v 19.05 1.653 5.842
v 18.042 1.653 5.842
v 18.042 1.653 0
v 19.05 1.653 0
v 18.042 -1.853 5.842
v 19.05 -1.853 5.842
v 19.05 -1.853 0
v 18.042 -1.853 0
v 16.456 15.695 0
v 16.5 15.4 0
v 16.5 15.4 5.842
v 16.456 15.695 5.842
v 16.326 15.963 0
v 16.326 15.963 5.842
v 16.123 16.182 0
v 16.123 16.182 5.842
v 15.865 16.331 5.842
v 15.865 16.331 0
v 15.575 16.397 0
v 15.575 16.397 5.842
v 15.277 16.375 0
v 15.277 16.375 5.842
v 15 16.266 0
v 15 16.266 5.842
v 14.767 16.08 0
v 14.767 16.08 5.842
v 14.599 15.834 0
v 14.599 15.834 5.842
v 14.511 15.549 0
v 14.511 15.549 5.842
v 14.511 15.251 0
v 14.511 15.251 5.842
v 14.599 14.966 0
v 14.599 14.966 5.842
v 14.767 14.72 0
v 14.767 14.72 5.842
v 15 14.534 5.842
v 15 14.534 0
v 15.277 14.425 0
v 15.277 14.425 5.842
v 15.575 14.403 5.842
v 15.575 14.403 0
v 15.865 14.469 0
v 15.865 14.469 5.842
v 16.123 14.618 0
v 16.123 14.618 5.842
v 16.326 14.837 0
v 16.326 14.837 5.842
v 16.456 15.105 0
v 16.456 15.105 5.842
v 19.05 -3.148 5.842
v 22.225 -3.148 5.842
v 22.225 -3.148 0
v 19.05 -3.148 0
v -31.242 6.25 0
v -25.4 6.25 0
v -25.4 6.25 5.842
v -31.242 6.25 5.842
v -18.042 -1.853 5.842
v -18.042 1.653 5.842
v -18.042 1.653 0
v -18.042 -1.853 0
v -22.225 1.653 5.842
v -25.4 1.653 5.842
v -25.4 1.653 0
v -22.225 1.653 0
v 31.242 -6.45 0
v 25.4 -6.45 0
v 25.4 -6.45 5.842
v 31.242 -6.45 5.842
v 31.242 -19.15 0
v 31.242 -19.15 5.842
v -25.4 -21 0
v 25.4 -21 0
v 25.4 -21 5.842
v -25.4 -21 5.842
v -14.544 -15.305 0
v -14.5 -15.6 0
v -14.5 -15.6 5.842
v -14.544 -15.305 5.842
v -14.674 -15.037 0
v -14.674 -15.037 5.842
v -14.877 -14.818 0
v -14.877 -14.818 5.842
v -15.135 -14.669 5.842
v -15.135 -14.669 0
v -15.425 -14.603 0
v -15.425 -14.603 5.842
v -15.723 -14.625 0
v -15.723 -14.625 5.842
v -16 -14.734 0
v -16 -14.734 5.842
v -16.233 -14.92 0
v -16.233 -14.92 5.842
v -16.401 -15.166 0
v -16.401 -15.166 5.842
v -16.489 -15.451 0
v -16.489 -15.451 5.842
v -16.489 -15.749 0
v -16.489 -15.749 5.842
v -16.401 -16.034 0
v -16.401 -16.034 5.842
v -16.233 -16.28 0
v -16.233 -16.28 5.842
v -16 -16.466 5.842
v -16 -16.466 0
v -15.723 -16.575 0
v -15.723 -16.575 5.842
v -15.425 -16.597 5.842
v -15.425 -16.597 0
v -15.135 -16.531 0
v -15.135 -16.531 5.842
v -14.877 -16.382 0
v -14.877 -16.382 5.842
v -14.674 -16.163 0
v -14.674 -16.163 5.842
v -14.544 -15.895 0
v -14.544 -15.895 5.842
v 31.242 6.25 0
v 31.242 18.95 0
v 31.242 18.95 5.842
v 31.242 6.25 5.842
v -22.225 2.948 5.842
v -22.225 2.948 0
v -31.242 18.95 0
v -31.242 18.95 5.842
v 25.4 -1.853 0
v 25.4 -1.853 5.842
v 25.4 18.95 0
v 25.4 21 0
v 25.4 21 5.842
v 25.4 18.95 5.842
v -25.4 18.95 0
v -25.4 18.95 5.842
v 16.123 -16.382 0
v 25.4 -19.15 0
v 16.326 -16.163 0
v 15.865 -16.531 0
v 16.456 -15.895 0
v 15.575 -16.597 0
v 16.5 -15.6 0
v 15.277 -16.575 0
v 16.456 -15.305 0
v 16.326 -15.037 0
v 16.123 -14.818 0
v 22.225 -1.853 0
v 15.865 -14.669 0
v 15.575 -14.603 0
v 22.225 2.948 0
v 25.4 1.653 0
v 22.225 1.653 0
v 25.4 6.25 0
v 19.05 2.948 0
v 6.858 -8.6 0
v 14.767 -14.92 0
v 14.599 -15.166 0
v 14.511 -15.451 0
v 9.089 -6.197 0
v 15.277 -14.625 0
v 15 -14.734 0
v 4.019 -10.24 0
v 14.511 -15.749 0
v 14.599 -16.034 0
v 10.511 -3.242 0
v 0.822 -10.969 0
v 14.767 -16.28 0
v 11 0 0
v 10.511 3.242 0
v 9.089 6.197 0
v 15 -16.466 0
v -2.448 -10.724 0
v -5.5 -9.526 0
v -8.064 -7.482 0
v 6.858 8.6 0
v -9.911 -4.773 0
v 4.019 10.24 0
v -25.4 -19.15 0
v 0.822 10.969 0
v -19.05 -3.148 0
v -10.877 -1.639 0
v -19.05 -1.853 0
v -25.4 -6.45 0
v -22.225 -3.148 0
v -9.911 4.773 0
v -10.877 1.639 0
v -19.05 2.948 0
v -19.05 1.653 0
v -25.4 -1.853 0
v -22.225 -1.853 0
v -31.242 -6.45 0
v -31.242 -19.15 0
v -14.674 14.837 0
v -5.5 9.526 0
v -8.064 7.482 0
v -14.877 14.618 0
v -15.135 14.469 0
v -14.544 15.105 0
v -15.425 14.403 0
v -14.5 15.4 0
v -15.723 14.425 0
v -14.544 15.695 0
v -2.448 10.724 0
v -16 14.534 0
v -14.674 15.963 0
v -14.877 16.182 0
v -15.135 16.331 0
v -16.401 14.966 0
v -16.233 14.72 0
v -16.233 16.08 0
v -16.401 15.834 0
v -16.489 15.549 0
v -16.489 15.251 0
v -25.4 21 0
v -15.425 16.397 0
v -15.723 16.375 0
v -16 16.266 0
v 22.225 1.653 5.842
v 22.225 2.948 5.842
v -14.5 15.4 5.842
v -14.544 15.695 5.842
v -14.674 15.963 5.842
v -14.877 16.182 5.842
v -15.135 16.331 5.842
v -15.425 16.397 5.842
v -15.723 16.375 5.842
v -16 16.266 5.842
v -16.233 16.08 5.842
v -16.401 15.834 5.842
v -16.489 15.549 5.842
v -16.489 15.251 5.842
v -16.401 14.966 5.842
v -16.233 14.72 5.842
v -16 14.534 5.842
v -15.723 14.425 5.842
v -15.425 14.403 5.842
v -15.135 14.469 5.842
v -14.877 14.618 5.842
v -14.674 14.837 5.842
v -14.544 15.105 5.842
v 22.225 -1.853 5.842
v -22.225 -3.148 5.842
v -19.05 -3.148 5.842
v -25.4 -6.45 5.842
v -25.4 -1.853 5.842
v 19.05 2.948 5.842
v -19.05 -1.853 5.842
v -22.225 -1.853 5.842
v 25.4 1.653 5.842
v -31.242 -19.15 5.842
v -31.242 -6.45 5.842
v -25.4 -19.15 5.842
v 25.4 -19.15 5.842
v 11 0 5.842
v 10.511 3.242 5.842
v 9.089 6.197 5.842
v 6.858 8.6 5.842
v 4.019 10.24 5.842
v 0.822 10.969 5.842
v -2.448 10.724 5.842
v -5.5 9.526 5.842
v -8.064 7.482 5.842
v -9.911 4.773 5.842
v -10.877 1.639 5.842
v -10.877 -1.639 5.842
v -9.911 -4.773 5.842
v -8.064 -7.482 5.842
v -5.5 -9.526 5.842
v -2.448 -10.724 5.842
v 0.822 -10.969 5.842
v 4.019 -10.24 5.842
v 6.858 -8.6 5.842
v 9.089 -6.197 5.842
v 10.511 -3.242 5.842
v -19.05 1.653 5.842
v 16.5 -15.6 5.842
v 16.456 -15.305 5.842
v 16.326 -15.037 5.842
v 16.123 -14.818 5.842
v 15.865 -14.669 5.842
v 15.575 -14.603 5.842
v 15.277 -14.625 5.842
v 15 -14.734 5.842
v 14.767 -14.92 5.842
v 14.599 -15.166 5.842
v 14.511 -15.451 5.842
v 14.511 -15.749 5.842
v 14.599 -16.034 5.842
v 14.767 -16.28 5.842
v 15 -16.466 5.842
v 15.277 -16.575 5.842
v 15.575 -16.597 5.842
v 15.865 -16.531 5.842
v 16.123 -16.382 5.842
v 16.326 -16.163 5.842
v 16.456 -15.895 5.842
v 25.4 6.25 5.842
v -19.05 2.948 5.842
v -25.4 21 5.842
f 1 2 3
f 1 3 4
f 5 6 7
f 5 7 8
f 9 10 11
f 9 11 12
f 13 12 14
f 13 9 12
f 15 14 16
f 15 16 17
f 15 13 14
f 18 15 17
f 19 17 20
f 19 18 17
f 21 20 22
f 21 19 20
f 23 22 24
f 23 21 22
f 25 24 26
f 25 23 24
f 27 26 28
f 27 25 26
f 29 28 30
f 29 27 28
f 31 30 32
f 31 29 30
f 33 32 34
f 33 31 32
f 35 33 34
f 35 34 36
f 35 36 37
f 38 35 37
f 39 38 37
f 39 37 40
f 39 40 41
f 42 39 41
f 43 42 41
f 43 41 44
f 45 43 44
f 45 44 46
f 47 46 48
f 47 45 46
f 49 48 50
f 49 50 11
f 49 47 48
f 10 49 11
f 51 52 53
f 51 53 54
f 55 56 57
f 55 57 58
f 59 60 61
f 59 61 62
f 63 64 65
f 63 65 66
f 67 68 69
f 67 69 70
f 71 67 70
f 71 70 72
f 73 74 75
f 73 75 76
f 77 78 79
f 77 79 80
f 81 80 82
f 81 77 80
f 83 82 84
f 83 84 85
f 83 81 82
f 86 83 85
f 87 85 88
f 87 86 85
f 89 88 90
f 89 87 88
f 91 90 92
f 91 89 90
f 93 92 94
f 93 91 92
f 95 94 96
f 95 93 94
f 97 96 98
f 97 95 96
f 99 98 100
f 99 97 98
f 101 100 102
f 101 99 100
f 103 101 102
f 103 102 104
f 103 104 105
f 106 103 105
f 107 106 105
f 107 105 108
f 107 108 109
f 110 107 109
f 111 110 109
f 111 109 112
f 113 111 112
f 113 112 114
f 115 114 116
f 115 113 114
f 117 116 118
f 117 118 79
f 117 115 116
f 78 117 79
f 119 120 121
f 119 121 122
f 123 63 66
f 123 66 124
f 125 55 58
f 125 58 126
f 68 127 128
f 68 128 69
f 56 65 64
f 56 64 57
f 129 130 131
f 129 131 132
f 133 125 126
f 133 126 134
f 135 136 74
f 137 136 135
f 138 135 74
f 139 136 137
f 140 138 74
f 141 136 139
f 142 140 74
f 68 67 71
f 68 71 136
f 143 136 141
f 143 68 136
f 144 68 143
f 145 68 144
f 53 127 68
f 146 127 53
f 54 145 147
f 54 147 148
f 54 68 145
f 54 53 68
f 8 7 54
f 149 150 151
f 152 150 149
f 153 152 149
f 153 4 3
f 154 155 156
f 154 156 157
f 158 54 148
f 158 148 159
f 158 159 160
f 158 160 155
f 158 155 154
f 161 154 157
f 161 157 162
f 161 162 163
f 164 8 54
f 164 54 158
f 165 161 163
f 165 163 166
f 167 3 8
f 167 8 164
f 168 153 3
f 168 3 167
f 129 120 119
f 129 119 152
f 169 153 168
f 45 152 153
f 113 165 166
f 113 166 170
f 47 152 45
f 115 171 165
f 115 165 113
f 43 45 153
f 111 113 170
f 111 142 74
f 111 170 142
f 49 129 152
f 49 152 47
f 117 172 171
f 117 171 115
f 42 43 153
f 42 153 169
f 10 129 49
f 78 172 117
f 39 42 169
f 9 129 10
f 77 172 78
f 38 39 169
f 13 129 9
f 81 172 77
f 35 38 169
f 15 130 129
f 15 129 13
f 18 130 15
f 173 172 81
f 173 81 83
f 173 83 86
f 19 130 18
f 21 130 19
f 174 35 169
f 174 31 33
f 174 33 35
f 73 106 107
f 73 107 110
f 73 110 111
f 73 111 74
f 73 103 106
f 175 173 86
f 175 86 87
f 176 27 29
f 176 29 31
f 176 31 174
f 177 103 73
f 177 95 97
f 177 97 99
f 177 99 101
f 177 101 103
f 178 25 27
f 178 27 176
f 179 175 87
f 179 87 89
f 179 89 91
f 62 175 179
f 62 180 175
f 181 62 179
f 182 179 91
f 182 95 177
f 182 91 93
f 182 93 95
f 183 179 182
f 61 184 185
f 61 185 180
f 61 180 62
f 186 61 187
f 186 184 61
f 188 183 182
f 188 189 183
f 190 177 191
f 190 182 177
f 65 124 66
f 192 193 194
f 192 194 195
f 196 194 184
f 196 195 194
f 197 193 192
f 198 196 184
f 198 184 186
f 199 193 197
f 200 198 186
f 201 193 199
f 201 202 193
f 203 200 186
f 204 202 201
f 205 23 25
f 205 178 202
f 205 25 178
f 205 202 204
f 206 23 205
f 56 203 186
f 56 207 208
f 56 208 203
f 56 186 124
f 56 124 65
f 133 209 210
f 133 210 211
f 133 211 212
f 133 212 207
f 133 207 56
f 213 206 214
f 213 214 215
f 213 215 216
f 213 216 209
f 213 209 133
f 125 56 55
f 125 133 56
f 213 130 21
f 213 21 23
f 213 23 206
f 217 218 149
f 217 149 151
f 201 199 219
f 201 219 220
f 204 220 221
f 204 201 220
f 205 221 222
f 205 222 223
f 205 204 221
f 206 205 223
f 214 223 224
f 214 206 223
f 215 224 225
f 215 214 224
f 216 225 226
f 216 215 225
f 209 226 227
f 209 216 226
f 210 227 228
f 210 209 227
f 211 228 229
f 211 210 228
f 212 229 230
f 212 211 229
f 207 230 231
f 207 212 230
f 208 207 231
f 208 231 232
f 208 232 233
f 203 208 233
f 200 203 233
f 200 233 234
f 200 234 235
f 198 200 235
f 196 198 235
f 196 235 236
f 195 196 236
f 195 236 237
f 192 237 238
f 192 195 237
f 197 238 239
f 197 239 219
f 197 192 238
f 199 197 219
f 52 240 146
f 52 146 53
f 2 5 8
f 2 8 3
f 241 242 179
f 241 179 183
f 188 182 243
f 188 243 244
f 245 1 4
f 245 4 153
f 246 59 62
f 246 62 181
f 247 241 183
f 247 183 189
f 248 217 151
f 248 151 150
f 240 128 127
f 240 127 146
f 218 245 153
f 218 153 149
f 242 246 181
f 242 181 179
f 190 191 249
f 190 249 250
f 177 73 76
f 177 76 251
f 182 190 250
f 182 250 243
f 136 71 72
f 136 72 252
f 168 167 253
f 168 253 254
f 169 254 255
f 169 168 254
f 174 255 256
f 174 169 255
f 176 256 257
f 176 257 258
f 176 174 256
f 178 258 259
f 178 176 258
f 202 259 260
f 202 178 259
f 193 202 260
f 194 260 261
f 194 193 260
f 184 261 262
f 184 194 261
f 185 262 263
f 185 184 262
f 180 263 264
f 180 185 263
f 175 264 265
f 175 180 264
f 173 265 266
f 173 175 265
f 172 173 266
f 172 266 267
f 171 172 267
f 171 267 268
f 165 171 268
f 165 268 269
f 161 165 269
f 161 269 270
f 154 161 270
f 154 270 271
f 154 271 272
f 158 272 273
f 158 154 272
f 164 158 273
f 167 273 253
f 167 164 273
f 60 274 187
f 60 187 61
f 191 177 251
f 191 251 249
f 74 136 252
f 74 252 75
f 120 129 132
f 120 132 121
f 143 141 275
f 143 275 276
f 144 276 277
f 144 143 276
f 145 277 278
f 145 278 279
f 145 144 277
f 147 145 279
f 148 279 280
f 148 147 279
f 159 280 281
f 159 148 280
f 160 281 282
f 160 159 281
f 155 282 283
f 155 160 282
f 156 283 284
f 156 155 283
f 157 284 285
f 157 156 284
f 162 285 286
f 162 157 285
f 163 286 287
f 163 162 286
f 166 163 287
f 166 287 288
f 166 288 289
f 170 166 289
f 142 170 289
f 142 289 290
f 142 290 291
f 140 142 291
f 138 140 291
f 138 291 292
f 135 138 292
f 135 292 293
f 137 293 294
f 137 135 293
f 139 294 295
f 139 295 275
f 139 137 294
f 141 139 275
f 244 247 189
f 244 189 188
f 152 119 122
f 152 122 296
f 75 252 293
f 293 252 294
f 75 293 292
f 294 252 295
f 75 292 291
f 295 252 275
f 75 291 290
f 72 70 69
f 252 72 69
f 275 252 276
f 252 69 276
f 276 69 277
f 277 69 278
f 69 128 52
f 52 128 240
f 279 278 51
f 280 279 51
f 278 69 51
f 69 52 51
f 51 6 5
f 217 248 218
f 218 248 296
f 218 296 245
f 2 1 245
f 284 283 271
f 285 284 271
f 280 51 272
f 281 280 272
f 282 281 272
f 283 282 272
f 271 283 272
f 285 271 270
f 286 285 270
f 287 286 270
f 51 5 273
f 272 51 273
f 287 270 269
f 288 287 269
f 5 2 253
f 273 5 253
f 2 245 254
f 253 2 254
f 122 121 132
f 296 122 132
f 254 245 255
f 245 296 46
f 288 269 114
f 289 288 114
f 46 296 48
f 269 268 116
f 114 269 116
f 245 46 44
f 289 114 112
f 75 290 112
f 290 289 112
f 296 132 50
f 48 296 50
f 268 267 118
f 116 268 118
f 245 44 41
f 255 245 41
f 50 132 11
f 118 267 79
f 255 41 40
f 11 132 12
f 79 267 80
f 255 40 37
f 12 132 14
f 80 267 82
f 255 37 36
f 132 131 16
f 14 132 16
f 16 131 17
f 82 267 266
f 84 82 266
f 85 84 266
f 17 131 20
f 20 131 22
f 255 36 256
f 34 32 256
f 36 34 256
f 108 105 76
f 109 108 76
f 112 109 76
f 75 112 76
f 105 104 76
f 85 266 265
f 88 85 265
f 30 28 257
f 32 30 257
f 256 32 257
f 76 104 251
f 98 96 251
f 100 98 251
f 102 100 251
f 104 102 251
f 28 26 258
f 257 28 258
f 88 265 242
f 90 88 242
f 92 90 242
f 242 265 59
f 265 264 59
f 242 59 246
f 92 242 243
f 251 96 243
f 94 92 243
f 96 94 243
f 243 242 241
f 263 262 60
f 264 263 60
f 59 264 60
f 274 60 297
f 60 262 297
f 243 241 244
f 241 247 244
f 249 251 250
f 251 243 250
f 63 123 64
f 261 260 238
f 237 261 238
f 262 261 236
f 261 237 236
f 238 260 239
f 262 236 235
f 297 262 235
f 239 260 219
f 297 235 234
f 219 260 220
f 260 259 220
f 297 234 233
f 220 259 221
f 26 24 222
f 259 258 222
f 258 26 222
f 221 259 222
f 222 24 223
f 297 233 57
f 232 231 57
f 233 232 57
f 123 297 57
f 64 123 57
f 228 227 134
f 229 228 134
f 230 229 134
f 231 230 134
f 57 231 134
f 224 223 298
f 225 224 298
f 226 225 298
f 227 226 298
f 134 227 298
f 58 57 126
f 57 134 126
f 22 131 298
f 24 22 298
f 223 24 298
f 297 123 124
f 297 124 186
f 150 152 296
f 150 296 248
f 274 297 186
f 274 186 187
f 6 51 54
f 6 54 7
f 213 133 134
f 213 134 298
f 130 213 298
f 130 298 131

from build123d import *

# Parameters (mm, degrees)
SKETCH1_R           = 1
SKETCH1_R_2         = 11
BOSS_EXTRUDE1_DEPTH = 5.842
CUT_EXTRUDE1_DEPTH  = 39.094507846


with BuildPart() as part:
    # Sketch1 → Boss-Extrude1 (new body)
    with BuildSketch(Plane.XY):
        Polygon((25.4, -21), (-25.4, -21), (-25.4, -19.15), (-31.242, -19.15), (-31.242, -6.45), (-25.4, -6.45), (-25.4, 6.25), (-31.242, 6.25), (-31.242, 18.95), (-25.4, 18.95), (-25.4, 21), (25.4, 21), (25.4, 18.95), (31.242, 18.95), (31.242, 6.25), (25.4, 6.25), (25.4, -6.45), (31.242, -6.45), (31.242, -19.15), (25.4, -19.15), align=None)
        with Locations((-15.5, 15.4)):
            Circle(SKETCH1_R, mode=Mode.SUBTRACT)
        with Locations((15.5, 15.4)):
            Circle(SKETCH1_R, mode=Mode.SUBTRACT)
        with Locations((-15.5, -15.6)):
            Circle(SKETCH1_R, mode=Mode.SUBTRACT)
        with Locations((15.5, -15.6)):
            Circle(SKETCH1_R, mode=Mode.SUBTRACT)
        Circle(SKETCH1_R_2, mode=Mode.SUBTRACT)
    extrude(amount=BOSS_EXTRUDE1_DEPTH)

    # Sketch2 → Cut-Extrude1 (cut, through all)
    with BuildSketch(Plane.XY.offset(5.842)):
        Polygon((-22.225, 1.6526), (-22.225, 2.948), (-19.05, 2.948), (-19.05, 1.6526), (-18.041999984, 1.6526), (-18.041999984, -1.8526), (-19.05, -1.8526), (-19.05, -3.148), (-22.225, -3.148), (-22.225, -1.8526), (-25.4, -1.8526), (-25.4, 1.6526), align=None)
        Polygon((18.041999984, 1.6526), (19.05, 1.6526), (19.05, 2.948), (22.225, 2.948), (22.225, 1.6526), (25.4, 1.6526), (25.4, -1.8526), (22.225, -1.8526), (22.225, -3.148), (19.05, -3.148), (19.05, -1.8526), (18.041999984, -1.8526), align=None)
    extrude(amount=-CUT_EXTRUDE1_DEPTH, mode=Mode.SUBTRACT)


solid = part.part
